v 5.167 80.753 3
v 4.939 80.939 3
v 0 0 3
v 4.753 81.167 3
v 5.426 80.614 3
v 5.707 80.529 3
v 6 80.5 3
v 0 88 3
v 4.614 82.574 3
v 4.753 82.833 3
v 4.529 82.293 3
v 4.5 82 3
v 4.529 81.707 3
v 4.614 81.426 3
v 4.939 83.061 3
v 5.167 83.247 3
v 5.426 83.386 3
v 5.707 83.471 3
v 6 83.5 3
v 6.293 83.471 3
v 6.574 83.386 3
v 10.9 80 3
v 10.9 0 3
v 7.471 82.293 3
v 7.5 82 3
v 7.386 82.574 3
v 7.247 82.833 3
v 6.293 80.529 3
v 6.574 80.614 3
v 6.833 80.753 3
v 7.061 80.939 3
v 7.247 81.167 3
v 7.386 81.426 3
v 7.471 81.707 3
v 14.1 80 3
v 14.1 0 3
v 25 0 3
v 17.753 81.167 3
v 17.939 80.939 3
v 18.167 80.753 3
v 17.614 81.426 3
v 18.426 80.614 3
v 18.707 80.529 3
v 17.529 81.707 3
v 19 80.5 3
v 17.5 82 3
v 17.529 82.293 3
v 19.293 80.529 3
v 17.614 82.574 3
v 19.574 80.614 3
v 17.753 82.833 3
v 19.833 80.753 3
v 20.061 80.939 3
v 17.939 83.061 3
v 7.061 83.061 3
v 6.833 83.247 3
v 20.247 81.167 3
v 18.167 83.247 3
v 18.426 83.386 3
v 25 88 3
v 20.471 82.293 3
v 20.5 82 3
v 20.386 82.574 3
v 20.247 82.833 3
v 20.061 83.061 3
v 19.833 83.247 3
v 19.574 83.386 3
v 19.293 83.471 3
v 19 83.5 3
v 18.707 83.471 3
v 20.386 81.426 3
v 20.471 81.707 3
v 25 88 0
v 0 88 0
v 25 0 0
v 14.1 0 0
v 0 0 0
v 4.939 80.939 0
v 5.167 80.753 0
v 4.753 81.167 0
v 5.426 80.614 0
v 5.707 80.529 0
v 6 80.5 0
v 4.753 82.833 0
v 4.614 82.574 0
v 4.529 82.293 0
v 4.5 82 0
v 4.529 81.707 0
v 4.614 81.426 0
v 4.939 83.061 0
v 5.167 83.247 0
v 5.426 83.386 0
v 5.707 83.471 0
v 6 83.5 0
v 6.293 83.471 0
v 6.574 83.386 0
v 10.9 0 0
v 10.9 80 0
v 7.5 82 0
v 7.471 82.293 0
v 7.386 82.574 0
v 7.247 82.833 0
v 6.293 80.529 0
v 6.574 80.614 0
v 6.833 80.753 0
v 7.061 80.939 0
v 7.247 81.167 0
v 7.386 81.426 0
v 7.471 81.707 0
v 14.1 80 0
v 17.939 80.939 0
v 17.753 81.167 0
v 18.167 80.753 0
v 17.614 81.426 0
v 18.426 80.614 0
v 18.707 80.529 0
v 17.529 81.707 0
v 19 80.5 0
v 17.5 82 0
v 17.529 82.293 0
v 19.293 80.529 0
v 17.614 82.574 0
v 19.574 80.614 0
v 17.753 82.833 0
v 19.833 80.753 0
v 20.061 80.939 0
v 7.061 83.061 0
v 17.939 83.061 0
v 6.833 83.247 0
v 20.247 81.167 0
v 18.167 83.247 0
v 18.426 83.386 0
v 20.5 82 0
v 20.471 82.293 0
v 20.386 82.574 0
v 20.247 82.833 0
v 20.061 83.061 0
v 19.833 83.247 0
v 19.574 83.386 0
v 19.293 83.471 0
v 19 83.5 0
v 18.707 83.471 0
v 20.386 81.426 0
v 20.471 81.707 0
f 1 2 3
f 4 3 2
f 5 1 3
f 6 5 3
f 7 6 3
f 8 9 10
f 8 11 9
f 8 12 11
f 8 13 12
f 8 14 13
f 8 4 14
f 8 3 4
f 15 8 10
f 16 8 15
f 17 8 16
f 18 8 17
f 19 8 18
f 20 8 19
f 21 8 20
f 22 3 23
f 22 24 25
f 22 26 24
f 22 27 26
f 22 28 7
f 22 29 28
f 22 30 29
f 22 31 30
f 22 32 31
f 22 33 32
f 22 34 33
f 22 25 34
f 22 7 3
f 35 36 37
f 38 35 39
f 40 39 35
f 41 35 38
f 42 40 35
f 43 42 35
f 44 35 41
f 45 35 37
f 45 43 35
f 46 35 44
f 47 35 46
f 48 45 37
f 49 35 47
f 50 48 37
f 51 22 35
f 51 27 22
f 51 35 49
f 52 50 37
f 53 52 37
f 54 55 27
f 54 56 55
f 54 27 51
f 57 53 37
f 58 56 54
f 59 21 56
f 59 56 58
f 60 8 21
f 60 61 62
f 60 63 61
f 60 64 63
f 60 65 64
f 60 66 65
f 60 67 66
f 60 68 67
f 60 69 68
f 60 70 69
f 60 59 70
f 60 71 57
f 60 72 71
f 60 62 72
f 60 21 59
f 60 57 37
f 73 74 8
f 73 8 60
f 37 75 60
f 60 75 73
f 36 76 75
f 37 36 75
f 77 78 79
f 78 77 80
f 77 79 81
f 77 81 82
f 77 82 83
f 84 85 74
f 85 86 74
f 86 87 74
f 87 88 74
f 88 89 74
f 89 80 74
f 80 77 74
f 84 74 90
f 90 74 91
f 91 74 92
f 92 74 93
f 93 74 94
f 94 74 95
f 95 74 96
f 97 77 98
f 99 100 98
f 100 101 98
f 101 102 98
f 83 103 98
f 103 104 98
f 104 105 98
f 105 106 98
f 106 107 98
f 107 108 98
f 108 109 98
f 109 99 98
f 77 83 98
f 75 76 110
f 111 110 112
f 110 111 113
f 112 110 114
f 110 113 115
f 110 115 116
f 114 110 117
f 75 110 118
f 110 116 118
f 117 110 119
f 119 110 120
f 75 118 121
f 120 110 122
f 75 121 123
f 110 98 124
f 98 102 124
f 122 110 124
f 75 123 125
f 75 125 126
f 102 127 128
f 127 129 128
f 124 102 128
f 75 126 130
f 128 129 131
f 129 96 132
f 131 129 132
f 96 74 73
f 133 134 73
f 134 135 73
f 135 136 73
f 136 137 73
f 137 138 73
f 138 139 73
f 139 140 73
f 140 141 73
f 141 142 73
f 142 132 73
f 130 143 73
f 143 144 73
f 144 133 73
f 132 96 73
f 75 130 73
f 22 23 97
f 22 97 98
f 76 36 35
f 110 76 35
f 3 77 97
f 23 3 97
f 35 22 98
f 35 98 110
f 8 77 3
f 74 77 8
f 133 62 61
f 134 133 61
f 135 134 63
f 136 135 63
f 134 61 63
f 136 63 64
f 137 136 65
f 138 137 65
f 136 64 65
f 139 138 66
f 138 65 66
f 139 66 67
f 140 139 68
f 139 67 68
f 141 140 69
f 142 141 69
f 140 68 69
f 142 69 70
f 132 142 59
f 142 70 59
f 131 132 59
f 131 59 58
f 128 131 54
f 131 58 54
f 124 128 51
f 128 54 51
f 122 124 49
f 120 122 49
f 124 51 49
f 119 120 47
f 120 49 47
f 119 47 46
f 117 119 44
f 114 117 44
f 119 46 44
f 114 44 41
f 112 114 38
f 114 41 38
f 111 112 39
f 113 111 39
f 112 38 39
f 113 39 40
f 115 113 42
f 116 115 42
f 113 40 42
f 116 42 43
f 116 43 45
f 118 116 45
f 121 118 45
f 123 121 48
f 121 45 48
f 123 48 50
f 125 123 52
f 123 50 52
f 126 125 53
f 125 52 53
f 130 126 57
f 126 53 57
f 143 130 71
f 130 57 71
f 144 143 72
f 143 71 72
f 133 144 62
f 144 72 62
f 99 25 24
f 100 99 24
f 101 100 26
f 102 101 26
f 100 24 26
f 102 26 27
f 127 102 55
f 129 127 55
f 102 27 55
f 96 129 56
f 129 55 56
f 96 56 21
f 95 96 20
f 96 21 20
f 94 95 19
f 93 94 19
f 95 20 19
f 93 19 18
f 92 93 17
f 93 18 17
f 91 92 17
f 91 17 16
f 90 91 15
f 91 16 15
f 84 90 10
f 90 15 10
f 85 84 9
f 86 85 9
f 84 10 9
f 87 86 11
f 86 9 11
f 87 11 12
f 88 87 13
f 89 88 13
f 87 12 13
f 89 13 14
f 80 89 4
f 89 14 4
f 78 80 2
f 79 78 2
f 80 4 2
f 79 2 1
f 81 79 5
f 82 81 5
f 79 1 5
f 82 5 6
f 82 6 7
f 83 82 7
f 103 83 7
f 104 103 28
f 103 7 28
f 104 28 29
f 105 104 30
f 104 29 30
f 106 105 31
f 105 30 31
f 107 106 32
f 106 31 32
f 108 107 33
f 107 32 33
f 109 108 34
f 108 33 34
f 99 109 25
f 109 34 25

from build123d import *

# Parameters (mm, degrees)
SKETCH1_W           = 25
SKETCH1_H           = 88
BOSS_EXTRUDE1_DEPTH = 3
SKETCH2_R           = 1.5
CUT_EXTRUDE1_DEPTH  = 3
SKETCH3_W           = 3.2
SKETCH3_H           = 80
CUT_EXTRUDE2_DEPTH  = 10


with BuildPart() as part:
    # Sketch1 → Boss-Extrude1 (new body)
    with BuildSketch(Plane.XY):
        with Locations((12.5, 44)):
            Rectangle(SKETCH1_W, SKETCH1_H)
    extrude(amount=BOSS_EXTRUDE1_DEPTH)

    # Sketch2 → Cut-Extrude1 (cut)
    with BuildSketch(Plane.XY.offset(3)):
        with Locations((19, 82)):
            Circle(SKETCH2_R)
        with Locations((6, 82)):
            Circle(SKETCH2_R)
    extrude(amount=-CUT_EXTRUDE1_DEPTH, mode=Mode.SUBTRACT)

    # Sketch3 → Cut-Extrude2 (cut)
    with BuildSketch(Plane.XY.offset(3)):
        with Locations((12.5, 40)):
            Rectangle(SKETCH3_W, SKETCH3_H)
    extrude(amount=-CUT_EXTRUDE2_DEPTH, mode=Mode.SUBTRACT)


solid = part.part
